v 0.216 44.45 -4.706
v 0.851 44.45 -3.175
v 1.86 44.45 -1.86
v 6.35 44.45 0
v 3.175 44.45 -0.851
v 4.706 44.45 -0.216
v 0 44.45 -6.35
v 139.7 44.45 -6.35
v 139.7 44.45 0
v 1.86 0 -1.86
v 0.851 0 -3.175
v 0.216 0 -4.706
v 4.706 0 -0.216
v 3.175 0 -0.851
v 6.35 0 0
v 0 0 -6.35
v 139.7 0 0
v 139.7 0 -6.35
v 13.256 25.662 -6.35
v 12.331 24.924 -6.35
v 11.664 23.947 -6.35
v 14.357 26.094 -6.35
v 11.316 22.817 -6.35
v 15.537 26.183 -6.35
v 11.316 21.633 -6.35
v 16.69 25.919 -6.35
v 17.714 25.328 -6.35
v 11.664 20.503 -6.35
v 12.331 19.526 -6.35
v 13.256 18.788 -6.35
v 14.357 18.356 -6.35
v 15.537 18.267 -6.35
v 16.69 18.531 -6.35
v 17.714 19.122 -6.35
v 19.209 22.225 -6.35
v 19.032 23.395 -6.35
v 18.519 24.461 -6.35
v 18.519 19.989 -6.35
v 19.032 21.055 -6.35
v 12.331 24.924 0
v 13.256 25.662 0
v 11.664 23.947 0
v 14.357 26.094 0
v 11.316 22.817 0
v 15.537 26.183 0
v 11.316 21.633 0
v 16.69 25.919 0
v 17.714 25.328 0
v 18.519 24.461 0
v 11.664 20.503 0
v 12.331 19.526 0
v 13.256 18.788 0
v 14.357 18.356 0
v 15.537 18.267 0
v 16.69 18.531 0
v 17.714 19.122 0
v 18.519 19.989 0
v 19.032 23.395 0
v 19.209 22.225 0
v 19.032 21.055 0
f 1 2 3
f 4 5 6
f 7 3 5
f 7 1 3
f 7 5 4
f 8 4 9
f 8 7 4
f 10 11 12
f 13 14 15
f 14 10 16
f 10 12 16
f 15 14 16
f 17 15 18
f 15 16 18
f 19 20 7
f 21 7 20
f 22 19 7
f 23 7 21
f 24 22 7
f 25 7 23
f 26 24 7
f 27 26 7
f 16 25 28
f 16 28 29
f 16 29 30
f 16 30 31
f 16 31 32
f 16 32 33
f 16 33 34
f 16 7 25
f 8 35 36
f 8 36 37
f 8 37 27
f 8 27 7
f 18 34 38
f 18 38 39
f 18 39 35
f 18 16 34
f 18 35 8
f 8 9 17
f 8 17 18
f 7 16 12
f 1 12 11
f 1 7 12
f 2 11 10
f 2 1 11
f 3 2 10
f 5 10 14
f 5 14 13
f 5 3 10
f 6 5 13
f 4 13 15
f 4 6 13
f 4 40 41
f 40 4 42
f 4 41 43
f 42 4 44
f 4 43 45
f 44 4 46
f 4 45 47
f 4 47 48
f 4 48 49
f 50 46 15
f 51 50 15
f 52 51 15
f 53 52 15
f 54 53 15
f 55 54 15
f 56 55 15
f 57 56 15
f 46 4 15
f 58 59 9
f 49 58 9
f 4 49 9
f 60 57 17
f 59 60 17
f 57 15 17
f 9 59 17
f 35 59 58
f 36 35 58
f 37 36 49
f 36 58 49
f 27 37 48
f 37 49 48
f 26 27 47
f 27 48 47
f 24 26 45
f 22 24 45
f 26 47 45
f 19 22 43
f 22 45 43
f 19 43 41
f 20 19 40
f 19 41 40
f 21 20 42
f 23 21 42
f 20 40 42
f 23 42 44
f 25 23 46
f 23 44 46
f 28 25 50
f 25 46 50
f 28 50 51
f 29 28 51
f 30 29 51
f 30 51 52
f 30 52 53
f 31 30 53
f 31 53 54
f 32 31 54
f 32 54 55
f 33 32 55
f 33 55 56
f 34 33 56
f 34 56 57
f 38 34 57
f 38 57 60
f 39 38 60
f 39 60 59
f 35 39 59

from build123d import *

# Parameters (mm, degrees)
SKETCH1_W           = 139.7
SKETCH1_H           = 6.35
BOSS_EXTRUDE1_DEPTH = 44.45
FILLET1_R           = 6.35
SKETCH4_R           = 3.96875
CUT_EXTRUDE2_DEPTH  = 254


with BuildPart() as part:
    # Sketch1 → Boss-Extrude1 (new body)
    with BuildSketch(Plane(origin=(0, 0, 0), x_dir=(1, 0, 0), z_dir=(0, 1, 0))):
        with Locations((69.85, 3.175)):
            Rectangle(SKETCH1_W, SKETCH1_H)
    extrude(amount=BOSS_EXTRUDE1_DEPTH)

    # Fillet1
    fillet1_edges = [part.edges().sort_by_distance(p)[0] for p in [
        (0, 22.225, 0),
    ]]
    fillet(fillet1_edges, radius=FILLET1_R - 0.0001)  # a hair under: the kernel refuses the full size

    # Sketch4 → Cut-Extrude2 (cut)
    with BuildSketch(Plane(origin=(69.948790088, 1.415162488, 0), x_dir=(1, 0, 0), z_dir=(0, 0, 1))):
        with Locations((-54.708790088, 20.809837512)):
            Circle(SKETCH4_R)
    extrude(amount=-CUT_EXTRUDE2_DEPTH, mode=Mode.SUBTRACT)


solid = part.part
